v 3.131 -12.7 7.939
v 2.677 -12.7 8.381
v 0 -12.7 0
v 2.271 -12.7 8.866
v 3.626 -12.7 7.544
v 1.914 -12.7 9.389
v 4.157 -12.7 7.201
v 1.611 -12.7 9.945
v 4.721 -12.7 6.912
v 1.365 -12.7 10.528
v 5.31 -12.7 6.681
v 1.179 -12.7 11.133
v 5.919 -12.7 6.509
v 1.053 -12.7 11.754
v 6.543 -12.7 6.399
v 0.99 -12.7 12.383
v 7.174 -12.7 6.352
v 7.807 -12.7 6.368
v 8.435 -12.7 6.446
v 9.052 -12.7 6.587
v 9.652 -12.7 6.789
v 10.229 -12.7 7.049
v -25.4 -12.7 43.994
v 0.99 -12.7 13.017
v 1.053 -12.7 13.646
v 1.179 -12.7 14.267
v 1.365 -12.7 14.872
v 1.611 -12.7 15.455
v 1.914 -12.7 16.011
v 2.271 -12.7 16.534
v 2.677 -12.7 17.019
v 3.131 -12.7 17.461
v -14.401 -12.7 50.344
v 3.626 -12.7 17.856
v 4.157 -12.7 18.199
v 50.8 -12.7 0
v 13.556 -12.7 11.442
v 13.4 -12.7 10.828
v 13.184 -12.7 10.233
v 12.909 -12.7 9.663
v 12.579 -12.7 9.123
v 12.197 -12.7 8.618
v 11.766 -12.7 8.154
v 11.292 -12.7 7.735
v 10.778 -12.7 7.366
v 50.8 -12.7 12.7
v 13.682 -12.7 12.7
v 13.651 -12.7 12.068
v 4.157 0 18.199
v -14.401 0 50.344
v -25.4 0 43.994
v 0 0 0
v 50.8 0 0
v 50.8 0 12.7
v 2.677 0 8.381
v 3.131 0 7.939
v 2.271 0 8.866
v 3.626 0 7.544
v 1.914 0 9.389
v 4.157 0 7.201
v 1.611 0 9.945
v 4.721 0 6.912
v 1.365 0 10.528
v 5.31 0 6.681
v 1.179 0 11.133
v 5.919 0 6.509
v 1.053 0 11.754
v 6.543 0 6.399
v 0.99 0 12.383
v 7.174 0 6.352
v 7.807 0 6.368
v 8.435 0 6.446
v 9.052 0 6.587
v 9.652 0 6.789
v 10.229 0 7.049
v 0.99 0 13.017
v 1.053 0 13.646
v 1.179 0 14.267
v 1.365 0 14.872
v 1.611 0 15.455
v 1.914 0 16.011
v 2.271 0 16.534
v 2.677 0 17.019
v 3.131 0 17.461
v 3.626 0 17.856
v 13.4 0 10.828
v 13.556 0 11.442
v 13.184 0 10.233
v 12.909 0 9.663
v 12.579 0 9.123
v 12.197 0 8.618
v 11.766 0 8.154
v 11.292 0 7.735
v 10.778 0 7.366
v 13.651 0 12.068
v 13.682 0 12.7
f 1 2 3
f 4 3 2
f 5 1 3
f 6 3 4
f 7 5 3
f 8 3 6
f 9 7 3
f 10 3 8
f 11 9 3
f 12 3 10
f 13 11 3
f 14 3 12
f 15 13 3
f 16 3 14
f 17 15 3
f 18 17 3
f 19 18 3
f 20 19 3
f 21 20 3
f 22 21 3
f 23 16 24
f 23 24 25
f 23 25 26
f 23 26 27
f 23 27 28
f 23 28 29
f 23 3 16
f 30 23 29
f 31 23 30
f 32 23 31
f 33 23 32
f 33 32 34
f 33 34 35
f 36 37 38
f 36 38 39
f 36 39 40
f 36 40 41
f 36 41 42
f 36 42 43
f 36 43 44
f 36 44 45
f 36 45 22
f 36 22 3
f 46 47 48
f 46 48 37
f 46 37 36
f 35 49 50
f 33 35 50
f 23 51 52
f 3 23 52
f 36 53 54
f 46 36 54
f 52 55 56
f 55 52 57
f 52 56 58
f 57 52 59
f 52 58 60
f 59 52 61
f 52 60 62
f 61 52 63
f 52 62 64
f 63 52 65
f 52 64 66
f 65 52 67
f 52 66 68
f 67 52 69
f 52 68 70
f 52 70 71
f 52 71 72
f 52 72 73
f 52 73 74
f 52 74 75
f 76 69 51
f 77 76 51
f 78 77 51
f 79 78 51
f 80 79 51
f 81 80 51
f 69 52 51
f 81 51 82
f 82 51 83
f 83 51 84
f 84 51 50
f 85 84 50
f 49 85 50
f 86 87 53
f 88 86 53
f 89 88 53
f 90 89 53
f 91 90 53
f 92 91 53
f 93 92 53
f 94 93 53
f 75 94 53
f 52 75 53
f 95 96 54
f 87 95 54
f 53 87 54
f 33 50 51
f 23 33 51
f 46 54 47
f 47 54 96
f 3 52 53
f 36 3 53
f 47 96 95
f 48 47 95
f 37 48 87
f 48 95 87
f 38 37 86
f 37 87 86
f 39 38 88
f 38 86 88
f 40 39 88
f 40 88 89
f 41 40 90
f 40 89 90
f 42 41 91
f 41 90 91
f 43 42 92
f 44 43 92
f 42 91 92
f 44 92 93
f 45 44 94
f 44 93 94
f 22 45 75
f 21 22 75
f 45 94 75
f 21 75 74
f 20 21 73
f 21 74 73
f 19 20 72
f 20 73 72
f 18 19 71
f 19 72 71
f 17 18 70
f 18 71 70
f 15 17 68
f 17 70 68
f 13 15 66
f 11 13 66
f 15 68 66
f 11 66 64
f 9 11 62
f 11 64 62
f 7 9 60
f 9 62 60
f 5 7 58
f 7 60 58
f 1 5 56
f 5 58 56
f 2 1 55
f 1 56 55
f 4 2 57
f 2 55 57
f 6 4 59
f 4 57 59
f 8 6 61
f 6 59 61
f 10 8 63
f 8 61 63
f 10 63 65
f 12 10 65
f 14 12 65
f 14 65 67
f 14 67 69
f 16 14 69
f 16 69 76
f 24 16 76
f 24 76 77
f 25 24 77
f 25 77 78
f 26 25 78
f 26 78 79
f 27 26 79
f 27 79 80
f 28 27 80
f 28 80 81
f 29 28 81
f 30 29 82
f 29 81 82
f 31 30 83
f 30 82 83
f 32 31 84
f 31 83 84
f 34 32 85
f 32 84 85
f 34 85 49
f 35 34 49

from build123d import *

# Parameters (mm, degrees)
F1_DEPTH = 12.7


with BuildPart() as f1:
    # F0 (on Front) → F1 (new body)
    with BuildSketch(Plane.XZ):
        with BuildLine():
            Line((-25.4, 43.994091), (0, 0))
            Line((0, 0), (50.8, 0))
            Line((50.8, 0), (50.8, 12.7))
            Line((50.8, 12.7), (13.682348, 12.7))
            ThreePointArc((13.682348, 12.7), (4.157348, 7.200739), (4.157348, 18.199261))
            Line((4.157348, 18.199261), (-14.401477, 50.344091))
            Line((-14.401477, 50.344091), (-25.4, 43.994091))
        make_face()
    extrude(amount=F1_DEPTH)


solid = f1.part
